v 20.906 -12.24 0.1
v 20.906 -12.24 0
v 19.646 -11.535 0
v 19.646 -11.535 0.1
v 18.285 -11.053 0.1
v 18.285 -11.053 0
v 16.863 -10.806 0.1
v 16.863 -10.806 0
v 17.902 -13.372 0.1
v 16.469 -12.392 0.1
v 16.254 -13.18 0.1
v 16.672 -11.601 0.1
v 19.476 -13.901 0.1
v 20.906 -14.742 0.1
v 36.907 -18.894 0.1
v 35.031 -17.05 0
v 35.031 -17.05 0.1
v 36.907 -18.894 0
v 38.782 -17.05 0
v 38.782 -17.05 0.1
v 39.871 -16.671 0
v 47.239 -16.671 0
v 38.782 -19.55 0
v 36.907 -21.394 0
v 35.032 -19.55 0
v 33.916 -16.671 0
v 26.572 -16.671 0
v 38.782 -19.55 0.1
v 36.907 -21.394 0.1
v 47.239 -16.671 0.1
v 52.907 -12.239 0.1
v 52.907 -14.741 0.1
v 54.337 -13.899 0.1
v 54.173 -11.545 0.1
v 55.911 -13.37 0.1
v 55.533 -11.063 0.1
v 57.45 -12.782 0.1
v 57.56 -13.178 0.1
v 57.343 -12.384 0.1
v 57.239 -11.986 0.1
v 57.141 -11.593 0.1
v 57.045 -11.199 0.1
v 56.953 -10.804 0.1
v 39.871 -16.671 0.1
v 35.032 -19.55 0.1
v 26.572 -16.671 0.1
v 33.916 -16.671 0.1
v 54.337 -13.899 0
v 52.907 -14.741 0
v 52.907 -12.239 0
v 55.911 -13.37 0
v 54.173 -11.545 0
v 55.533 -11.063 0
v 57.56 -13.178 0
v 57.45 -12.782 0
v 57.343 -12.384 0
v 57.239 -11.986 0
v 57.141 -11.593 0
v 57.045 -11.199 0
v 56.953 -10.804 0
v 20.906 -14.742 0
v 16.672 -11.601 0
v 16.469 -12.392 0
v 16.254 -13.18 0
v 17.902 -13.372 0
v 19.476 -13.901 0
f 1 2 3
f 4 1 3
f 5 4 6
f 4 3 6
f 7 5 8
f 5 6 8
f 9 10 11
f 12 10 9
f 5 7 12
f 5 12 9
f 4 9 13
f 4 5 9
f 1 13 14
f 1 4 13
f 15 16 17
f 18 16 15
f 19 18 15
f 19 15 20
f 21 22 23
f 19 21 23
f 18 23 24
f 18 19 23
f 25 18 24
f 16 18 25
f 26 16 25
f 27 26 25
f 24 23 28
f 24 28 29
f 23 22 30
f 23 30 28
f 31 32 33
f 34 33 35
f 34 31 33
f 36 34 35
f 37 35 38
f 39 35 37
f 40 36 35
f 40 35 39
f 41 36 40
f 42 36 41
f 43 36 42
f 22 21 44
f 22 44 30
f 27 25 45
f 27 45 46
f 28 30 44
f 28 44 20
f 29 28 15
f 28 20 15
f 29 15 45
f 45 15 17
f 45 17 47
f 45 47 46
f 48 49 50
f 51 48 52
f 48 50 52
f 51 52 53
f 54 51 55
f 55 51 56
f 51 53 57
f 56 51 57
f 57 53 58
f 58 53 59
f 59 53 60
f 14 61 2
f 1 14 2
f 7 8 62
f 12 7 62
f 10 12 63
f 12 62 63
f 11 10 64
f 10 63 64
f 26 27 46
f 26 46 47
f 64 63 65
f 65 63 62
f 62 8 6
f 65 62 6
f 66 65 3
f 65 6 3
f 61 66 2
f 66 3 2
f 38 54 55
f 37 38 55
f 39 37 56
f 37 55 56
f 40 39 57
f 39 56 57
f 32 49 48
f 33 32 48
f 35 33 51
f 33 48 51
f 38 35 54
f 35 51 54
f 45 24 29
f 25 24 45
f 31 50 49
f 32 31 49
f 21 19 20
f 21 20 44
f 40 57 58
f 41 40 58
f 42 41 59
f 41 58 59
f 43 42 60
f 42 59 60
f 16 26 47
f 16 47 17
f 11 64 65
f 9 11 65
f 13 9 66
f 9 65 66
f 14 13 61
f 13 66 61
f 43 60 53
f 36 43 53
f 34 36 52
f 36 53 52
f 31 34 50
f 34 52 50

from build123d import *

# Parameters (mm, degrees)
SALIENTE_EXTRUIR1_DEPTH   = 0.1
SALIENTE_EXTRUIR1_2_DEPTH = 0.1
SALIENTE_EXTRUIR1_3_DEPTH = 0.1


with BuildPart() as part:
    # Model → Saliente-Extruir1 (new body)
    with BuildSketch(Plane.XY):
        with BuildLine():
            ThreePointArc((16.253690147, -13.180235977), (18.70290977, -13.595394577), (20.906414144, -14.742391482))
            Line((20.906414144, -14.742391482), (20.906176461, -12.240206894))
            ThreePointArc((20.906176461, -12.240206894), (18.975913125, -11.265172682), (16.862658207, -10.806084555))
            ThreePointArc((16.862658207, -10.806084555), (16.572539002, -11.996844833), (16.253690147, -13.180235977))
        make_face()
    extrude(amount=SALIENTE_EXTRUIR1_DEPTH)


with BuildPart() as body_2:
    # Model → Saliente-Extruir1 2 (new body)
    with BuildSketch(Plane.XY):
        Polygon((47.239091143, -16.670761499), (38.78228857, -19.550227381), (36.907167402, -21.394207383), (35.031633608, -19.550405519), (26.571674165, -16.670761499), (33.916059279, -16.670761499), (35.031396133, -17.05040553), (36.906929927, -18.894207394), (38.78228857, -17.050227381), (39.870796767, -16.670761499), align=None)
    extrude(amount=SALIENTE_EXTRUIR1_2_DEPTH)


with BuildPart() as body_3:
    # Model → Saliente-Extruir1 3 (new body)
    with BuildSketch(Plane.XY):
        with BuildLine():
            ThreePointArc((56.952895616, -10.80397792), (54.843195929, -11.27662203), (52.907051257, -12.238687012))
            Line((52.907051257, -12.238687012), (52.907051257, -14.740871612))
            ThreePointArc((52.907051257, -14.740871612), (55.110446668, -13.593665401), (57.559626843, -13.178274152))
            ThreePointArc((57.559626843, -13.178274152), (57.395729395, -12.582964534), (57.239261898, -11.985659053))
            ThreePointArc((57.239261898, -11.985659053), (57.092497922, -11.395686259), (56.952895616, -10.80397792))
        make_face()
    extrude(amount=SALIENTE_EXTRUIR1_3_DEPTH)


solid = Compound([part.part, body_2.part, body_3.part])
